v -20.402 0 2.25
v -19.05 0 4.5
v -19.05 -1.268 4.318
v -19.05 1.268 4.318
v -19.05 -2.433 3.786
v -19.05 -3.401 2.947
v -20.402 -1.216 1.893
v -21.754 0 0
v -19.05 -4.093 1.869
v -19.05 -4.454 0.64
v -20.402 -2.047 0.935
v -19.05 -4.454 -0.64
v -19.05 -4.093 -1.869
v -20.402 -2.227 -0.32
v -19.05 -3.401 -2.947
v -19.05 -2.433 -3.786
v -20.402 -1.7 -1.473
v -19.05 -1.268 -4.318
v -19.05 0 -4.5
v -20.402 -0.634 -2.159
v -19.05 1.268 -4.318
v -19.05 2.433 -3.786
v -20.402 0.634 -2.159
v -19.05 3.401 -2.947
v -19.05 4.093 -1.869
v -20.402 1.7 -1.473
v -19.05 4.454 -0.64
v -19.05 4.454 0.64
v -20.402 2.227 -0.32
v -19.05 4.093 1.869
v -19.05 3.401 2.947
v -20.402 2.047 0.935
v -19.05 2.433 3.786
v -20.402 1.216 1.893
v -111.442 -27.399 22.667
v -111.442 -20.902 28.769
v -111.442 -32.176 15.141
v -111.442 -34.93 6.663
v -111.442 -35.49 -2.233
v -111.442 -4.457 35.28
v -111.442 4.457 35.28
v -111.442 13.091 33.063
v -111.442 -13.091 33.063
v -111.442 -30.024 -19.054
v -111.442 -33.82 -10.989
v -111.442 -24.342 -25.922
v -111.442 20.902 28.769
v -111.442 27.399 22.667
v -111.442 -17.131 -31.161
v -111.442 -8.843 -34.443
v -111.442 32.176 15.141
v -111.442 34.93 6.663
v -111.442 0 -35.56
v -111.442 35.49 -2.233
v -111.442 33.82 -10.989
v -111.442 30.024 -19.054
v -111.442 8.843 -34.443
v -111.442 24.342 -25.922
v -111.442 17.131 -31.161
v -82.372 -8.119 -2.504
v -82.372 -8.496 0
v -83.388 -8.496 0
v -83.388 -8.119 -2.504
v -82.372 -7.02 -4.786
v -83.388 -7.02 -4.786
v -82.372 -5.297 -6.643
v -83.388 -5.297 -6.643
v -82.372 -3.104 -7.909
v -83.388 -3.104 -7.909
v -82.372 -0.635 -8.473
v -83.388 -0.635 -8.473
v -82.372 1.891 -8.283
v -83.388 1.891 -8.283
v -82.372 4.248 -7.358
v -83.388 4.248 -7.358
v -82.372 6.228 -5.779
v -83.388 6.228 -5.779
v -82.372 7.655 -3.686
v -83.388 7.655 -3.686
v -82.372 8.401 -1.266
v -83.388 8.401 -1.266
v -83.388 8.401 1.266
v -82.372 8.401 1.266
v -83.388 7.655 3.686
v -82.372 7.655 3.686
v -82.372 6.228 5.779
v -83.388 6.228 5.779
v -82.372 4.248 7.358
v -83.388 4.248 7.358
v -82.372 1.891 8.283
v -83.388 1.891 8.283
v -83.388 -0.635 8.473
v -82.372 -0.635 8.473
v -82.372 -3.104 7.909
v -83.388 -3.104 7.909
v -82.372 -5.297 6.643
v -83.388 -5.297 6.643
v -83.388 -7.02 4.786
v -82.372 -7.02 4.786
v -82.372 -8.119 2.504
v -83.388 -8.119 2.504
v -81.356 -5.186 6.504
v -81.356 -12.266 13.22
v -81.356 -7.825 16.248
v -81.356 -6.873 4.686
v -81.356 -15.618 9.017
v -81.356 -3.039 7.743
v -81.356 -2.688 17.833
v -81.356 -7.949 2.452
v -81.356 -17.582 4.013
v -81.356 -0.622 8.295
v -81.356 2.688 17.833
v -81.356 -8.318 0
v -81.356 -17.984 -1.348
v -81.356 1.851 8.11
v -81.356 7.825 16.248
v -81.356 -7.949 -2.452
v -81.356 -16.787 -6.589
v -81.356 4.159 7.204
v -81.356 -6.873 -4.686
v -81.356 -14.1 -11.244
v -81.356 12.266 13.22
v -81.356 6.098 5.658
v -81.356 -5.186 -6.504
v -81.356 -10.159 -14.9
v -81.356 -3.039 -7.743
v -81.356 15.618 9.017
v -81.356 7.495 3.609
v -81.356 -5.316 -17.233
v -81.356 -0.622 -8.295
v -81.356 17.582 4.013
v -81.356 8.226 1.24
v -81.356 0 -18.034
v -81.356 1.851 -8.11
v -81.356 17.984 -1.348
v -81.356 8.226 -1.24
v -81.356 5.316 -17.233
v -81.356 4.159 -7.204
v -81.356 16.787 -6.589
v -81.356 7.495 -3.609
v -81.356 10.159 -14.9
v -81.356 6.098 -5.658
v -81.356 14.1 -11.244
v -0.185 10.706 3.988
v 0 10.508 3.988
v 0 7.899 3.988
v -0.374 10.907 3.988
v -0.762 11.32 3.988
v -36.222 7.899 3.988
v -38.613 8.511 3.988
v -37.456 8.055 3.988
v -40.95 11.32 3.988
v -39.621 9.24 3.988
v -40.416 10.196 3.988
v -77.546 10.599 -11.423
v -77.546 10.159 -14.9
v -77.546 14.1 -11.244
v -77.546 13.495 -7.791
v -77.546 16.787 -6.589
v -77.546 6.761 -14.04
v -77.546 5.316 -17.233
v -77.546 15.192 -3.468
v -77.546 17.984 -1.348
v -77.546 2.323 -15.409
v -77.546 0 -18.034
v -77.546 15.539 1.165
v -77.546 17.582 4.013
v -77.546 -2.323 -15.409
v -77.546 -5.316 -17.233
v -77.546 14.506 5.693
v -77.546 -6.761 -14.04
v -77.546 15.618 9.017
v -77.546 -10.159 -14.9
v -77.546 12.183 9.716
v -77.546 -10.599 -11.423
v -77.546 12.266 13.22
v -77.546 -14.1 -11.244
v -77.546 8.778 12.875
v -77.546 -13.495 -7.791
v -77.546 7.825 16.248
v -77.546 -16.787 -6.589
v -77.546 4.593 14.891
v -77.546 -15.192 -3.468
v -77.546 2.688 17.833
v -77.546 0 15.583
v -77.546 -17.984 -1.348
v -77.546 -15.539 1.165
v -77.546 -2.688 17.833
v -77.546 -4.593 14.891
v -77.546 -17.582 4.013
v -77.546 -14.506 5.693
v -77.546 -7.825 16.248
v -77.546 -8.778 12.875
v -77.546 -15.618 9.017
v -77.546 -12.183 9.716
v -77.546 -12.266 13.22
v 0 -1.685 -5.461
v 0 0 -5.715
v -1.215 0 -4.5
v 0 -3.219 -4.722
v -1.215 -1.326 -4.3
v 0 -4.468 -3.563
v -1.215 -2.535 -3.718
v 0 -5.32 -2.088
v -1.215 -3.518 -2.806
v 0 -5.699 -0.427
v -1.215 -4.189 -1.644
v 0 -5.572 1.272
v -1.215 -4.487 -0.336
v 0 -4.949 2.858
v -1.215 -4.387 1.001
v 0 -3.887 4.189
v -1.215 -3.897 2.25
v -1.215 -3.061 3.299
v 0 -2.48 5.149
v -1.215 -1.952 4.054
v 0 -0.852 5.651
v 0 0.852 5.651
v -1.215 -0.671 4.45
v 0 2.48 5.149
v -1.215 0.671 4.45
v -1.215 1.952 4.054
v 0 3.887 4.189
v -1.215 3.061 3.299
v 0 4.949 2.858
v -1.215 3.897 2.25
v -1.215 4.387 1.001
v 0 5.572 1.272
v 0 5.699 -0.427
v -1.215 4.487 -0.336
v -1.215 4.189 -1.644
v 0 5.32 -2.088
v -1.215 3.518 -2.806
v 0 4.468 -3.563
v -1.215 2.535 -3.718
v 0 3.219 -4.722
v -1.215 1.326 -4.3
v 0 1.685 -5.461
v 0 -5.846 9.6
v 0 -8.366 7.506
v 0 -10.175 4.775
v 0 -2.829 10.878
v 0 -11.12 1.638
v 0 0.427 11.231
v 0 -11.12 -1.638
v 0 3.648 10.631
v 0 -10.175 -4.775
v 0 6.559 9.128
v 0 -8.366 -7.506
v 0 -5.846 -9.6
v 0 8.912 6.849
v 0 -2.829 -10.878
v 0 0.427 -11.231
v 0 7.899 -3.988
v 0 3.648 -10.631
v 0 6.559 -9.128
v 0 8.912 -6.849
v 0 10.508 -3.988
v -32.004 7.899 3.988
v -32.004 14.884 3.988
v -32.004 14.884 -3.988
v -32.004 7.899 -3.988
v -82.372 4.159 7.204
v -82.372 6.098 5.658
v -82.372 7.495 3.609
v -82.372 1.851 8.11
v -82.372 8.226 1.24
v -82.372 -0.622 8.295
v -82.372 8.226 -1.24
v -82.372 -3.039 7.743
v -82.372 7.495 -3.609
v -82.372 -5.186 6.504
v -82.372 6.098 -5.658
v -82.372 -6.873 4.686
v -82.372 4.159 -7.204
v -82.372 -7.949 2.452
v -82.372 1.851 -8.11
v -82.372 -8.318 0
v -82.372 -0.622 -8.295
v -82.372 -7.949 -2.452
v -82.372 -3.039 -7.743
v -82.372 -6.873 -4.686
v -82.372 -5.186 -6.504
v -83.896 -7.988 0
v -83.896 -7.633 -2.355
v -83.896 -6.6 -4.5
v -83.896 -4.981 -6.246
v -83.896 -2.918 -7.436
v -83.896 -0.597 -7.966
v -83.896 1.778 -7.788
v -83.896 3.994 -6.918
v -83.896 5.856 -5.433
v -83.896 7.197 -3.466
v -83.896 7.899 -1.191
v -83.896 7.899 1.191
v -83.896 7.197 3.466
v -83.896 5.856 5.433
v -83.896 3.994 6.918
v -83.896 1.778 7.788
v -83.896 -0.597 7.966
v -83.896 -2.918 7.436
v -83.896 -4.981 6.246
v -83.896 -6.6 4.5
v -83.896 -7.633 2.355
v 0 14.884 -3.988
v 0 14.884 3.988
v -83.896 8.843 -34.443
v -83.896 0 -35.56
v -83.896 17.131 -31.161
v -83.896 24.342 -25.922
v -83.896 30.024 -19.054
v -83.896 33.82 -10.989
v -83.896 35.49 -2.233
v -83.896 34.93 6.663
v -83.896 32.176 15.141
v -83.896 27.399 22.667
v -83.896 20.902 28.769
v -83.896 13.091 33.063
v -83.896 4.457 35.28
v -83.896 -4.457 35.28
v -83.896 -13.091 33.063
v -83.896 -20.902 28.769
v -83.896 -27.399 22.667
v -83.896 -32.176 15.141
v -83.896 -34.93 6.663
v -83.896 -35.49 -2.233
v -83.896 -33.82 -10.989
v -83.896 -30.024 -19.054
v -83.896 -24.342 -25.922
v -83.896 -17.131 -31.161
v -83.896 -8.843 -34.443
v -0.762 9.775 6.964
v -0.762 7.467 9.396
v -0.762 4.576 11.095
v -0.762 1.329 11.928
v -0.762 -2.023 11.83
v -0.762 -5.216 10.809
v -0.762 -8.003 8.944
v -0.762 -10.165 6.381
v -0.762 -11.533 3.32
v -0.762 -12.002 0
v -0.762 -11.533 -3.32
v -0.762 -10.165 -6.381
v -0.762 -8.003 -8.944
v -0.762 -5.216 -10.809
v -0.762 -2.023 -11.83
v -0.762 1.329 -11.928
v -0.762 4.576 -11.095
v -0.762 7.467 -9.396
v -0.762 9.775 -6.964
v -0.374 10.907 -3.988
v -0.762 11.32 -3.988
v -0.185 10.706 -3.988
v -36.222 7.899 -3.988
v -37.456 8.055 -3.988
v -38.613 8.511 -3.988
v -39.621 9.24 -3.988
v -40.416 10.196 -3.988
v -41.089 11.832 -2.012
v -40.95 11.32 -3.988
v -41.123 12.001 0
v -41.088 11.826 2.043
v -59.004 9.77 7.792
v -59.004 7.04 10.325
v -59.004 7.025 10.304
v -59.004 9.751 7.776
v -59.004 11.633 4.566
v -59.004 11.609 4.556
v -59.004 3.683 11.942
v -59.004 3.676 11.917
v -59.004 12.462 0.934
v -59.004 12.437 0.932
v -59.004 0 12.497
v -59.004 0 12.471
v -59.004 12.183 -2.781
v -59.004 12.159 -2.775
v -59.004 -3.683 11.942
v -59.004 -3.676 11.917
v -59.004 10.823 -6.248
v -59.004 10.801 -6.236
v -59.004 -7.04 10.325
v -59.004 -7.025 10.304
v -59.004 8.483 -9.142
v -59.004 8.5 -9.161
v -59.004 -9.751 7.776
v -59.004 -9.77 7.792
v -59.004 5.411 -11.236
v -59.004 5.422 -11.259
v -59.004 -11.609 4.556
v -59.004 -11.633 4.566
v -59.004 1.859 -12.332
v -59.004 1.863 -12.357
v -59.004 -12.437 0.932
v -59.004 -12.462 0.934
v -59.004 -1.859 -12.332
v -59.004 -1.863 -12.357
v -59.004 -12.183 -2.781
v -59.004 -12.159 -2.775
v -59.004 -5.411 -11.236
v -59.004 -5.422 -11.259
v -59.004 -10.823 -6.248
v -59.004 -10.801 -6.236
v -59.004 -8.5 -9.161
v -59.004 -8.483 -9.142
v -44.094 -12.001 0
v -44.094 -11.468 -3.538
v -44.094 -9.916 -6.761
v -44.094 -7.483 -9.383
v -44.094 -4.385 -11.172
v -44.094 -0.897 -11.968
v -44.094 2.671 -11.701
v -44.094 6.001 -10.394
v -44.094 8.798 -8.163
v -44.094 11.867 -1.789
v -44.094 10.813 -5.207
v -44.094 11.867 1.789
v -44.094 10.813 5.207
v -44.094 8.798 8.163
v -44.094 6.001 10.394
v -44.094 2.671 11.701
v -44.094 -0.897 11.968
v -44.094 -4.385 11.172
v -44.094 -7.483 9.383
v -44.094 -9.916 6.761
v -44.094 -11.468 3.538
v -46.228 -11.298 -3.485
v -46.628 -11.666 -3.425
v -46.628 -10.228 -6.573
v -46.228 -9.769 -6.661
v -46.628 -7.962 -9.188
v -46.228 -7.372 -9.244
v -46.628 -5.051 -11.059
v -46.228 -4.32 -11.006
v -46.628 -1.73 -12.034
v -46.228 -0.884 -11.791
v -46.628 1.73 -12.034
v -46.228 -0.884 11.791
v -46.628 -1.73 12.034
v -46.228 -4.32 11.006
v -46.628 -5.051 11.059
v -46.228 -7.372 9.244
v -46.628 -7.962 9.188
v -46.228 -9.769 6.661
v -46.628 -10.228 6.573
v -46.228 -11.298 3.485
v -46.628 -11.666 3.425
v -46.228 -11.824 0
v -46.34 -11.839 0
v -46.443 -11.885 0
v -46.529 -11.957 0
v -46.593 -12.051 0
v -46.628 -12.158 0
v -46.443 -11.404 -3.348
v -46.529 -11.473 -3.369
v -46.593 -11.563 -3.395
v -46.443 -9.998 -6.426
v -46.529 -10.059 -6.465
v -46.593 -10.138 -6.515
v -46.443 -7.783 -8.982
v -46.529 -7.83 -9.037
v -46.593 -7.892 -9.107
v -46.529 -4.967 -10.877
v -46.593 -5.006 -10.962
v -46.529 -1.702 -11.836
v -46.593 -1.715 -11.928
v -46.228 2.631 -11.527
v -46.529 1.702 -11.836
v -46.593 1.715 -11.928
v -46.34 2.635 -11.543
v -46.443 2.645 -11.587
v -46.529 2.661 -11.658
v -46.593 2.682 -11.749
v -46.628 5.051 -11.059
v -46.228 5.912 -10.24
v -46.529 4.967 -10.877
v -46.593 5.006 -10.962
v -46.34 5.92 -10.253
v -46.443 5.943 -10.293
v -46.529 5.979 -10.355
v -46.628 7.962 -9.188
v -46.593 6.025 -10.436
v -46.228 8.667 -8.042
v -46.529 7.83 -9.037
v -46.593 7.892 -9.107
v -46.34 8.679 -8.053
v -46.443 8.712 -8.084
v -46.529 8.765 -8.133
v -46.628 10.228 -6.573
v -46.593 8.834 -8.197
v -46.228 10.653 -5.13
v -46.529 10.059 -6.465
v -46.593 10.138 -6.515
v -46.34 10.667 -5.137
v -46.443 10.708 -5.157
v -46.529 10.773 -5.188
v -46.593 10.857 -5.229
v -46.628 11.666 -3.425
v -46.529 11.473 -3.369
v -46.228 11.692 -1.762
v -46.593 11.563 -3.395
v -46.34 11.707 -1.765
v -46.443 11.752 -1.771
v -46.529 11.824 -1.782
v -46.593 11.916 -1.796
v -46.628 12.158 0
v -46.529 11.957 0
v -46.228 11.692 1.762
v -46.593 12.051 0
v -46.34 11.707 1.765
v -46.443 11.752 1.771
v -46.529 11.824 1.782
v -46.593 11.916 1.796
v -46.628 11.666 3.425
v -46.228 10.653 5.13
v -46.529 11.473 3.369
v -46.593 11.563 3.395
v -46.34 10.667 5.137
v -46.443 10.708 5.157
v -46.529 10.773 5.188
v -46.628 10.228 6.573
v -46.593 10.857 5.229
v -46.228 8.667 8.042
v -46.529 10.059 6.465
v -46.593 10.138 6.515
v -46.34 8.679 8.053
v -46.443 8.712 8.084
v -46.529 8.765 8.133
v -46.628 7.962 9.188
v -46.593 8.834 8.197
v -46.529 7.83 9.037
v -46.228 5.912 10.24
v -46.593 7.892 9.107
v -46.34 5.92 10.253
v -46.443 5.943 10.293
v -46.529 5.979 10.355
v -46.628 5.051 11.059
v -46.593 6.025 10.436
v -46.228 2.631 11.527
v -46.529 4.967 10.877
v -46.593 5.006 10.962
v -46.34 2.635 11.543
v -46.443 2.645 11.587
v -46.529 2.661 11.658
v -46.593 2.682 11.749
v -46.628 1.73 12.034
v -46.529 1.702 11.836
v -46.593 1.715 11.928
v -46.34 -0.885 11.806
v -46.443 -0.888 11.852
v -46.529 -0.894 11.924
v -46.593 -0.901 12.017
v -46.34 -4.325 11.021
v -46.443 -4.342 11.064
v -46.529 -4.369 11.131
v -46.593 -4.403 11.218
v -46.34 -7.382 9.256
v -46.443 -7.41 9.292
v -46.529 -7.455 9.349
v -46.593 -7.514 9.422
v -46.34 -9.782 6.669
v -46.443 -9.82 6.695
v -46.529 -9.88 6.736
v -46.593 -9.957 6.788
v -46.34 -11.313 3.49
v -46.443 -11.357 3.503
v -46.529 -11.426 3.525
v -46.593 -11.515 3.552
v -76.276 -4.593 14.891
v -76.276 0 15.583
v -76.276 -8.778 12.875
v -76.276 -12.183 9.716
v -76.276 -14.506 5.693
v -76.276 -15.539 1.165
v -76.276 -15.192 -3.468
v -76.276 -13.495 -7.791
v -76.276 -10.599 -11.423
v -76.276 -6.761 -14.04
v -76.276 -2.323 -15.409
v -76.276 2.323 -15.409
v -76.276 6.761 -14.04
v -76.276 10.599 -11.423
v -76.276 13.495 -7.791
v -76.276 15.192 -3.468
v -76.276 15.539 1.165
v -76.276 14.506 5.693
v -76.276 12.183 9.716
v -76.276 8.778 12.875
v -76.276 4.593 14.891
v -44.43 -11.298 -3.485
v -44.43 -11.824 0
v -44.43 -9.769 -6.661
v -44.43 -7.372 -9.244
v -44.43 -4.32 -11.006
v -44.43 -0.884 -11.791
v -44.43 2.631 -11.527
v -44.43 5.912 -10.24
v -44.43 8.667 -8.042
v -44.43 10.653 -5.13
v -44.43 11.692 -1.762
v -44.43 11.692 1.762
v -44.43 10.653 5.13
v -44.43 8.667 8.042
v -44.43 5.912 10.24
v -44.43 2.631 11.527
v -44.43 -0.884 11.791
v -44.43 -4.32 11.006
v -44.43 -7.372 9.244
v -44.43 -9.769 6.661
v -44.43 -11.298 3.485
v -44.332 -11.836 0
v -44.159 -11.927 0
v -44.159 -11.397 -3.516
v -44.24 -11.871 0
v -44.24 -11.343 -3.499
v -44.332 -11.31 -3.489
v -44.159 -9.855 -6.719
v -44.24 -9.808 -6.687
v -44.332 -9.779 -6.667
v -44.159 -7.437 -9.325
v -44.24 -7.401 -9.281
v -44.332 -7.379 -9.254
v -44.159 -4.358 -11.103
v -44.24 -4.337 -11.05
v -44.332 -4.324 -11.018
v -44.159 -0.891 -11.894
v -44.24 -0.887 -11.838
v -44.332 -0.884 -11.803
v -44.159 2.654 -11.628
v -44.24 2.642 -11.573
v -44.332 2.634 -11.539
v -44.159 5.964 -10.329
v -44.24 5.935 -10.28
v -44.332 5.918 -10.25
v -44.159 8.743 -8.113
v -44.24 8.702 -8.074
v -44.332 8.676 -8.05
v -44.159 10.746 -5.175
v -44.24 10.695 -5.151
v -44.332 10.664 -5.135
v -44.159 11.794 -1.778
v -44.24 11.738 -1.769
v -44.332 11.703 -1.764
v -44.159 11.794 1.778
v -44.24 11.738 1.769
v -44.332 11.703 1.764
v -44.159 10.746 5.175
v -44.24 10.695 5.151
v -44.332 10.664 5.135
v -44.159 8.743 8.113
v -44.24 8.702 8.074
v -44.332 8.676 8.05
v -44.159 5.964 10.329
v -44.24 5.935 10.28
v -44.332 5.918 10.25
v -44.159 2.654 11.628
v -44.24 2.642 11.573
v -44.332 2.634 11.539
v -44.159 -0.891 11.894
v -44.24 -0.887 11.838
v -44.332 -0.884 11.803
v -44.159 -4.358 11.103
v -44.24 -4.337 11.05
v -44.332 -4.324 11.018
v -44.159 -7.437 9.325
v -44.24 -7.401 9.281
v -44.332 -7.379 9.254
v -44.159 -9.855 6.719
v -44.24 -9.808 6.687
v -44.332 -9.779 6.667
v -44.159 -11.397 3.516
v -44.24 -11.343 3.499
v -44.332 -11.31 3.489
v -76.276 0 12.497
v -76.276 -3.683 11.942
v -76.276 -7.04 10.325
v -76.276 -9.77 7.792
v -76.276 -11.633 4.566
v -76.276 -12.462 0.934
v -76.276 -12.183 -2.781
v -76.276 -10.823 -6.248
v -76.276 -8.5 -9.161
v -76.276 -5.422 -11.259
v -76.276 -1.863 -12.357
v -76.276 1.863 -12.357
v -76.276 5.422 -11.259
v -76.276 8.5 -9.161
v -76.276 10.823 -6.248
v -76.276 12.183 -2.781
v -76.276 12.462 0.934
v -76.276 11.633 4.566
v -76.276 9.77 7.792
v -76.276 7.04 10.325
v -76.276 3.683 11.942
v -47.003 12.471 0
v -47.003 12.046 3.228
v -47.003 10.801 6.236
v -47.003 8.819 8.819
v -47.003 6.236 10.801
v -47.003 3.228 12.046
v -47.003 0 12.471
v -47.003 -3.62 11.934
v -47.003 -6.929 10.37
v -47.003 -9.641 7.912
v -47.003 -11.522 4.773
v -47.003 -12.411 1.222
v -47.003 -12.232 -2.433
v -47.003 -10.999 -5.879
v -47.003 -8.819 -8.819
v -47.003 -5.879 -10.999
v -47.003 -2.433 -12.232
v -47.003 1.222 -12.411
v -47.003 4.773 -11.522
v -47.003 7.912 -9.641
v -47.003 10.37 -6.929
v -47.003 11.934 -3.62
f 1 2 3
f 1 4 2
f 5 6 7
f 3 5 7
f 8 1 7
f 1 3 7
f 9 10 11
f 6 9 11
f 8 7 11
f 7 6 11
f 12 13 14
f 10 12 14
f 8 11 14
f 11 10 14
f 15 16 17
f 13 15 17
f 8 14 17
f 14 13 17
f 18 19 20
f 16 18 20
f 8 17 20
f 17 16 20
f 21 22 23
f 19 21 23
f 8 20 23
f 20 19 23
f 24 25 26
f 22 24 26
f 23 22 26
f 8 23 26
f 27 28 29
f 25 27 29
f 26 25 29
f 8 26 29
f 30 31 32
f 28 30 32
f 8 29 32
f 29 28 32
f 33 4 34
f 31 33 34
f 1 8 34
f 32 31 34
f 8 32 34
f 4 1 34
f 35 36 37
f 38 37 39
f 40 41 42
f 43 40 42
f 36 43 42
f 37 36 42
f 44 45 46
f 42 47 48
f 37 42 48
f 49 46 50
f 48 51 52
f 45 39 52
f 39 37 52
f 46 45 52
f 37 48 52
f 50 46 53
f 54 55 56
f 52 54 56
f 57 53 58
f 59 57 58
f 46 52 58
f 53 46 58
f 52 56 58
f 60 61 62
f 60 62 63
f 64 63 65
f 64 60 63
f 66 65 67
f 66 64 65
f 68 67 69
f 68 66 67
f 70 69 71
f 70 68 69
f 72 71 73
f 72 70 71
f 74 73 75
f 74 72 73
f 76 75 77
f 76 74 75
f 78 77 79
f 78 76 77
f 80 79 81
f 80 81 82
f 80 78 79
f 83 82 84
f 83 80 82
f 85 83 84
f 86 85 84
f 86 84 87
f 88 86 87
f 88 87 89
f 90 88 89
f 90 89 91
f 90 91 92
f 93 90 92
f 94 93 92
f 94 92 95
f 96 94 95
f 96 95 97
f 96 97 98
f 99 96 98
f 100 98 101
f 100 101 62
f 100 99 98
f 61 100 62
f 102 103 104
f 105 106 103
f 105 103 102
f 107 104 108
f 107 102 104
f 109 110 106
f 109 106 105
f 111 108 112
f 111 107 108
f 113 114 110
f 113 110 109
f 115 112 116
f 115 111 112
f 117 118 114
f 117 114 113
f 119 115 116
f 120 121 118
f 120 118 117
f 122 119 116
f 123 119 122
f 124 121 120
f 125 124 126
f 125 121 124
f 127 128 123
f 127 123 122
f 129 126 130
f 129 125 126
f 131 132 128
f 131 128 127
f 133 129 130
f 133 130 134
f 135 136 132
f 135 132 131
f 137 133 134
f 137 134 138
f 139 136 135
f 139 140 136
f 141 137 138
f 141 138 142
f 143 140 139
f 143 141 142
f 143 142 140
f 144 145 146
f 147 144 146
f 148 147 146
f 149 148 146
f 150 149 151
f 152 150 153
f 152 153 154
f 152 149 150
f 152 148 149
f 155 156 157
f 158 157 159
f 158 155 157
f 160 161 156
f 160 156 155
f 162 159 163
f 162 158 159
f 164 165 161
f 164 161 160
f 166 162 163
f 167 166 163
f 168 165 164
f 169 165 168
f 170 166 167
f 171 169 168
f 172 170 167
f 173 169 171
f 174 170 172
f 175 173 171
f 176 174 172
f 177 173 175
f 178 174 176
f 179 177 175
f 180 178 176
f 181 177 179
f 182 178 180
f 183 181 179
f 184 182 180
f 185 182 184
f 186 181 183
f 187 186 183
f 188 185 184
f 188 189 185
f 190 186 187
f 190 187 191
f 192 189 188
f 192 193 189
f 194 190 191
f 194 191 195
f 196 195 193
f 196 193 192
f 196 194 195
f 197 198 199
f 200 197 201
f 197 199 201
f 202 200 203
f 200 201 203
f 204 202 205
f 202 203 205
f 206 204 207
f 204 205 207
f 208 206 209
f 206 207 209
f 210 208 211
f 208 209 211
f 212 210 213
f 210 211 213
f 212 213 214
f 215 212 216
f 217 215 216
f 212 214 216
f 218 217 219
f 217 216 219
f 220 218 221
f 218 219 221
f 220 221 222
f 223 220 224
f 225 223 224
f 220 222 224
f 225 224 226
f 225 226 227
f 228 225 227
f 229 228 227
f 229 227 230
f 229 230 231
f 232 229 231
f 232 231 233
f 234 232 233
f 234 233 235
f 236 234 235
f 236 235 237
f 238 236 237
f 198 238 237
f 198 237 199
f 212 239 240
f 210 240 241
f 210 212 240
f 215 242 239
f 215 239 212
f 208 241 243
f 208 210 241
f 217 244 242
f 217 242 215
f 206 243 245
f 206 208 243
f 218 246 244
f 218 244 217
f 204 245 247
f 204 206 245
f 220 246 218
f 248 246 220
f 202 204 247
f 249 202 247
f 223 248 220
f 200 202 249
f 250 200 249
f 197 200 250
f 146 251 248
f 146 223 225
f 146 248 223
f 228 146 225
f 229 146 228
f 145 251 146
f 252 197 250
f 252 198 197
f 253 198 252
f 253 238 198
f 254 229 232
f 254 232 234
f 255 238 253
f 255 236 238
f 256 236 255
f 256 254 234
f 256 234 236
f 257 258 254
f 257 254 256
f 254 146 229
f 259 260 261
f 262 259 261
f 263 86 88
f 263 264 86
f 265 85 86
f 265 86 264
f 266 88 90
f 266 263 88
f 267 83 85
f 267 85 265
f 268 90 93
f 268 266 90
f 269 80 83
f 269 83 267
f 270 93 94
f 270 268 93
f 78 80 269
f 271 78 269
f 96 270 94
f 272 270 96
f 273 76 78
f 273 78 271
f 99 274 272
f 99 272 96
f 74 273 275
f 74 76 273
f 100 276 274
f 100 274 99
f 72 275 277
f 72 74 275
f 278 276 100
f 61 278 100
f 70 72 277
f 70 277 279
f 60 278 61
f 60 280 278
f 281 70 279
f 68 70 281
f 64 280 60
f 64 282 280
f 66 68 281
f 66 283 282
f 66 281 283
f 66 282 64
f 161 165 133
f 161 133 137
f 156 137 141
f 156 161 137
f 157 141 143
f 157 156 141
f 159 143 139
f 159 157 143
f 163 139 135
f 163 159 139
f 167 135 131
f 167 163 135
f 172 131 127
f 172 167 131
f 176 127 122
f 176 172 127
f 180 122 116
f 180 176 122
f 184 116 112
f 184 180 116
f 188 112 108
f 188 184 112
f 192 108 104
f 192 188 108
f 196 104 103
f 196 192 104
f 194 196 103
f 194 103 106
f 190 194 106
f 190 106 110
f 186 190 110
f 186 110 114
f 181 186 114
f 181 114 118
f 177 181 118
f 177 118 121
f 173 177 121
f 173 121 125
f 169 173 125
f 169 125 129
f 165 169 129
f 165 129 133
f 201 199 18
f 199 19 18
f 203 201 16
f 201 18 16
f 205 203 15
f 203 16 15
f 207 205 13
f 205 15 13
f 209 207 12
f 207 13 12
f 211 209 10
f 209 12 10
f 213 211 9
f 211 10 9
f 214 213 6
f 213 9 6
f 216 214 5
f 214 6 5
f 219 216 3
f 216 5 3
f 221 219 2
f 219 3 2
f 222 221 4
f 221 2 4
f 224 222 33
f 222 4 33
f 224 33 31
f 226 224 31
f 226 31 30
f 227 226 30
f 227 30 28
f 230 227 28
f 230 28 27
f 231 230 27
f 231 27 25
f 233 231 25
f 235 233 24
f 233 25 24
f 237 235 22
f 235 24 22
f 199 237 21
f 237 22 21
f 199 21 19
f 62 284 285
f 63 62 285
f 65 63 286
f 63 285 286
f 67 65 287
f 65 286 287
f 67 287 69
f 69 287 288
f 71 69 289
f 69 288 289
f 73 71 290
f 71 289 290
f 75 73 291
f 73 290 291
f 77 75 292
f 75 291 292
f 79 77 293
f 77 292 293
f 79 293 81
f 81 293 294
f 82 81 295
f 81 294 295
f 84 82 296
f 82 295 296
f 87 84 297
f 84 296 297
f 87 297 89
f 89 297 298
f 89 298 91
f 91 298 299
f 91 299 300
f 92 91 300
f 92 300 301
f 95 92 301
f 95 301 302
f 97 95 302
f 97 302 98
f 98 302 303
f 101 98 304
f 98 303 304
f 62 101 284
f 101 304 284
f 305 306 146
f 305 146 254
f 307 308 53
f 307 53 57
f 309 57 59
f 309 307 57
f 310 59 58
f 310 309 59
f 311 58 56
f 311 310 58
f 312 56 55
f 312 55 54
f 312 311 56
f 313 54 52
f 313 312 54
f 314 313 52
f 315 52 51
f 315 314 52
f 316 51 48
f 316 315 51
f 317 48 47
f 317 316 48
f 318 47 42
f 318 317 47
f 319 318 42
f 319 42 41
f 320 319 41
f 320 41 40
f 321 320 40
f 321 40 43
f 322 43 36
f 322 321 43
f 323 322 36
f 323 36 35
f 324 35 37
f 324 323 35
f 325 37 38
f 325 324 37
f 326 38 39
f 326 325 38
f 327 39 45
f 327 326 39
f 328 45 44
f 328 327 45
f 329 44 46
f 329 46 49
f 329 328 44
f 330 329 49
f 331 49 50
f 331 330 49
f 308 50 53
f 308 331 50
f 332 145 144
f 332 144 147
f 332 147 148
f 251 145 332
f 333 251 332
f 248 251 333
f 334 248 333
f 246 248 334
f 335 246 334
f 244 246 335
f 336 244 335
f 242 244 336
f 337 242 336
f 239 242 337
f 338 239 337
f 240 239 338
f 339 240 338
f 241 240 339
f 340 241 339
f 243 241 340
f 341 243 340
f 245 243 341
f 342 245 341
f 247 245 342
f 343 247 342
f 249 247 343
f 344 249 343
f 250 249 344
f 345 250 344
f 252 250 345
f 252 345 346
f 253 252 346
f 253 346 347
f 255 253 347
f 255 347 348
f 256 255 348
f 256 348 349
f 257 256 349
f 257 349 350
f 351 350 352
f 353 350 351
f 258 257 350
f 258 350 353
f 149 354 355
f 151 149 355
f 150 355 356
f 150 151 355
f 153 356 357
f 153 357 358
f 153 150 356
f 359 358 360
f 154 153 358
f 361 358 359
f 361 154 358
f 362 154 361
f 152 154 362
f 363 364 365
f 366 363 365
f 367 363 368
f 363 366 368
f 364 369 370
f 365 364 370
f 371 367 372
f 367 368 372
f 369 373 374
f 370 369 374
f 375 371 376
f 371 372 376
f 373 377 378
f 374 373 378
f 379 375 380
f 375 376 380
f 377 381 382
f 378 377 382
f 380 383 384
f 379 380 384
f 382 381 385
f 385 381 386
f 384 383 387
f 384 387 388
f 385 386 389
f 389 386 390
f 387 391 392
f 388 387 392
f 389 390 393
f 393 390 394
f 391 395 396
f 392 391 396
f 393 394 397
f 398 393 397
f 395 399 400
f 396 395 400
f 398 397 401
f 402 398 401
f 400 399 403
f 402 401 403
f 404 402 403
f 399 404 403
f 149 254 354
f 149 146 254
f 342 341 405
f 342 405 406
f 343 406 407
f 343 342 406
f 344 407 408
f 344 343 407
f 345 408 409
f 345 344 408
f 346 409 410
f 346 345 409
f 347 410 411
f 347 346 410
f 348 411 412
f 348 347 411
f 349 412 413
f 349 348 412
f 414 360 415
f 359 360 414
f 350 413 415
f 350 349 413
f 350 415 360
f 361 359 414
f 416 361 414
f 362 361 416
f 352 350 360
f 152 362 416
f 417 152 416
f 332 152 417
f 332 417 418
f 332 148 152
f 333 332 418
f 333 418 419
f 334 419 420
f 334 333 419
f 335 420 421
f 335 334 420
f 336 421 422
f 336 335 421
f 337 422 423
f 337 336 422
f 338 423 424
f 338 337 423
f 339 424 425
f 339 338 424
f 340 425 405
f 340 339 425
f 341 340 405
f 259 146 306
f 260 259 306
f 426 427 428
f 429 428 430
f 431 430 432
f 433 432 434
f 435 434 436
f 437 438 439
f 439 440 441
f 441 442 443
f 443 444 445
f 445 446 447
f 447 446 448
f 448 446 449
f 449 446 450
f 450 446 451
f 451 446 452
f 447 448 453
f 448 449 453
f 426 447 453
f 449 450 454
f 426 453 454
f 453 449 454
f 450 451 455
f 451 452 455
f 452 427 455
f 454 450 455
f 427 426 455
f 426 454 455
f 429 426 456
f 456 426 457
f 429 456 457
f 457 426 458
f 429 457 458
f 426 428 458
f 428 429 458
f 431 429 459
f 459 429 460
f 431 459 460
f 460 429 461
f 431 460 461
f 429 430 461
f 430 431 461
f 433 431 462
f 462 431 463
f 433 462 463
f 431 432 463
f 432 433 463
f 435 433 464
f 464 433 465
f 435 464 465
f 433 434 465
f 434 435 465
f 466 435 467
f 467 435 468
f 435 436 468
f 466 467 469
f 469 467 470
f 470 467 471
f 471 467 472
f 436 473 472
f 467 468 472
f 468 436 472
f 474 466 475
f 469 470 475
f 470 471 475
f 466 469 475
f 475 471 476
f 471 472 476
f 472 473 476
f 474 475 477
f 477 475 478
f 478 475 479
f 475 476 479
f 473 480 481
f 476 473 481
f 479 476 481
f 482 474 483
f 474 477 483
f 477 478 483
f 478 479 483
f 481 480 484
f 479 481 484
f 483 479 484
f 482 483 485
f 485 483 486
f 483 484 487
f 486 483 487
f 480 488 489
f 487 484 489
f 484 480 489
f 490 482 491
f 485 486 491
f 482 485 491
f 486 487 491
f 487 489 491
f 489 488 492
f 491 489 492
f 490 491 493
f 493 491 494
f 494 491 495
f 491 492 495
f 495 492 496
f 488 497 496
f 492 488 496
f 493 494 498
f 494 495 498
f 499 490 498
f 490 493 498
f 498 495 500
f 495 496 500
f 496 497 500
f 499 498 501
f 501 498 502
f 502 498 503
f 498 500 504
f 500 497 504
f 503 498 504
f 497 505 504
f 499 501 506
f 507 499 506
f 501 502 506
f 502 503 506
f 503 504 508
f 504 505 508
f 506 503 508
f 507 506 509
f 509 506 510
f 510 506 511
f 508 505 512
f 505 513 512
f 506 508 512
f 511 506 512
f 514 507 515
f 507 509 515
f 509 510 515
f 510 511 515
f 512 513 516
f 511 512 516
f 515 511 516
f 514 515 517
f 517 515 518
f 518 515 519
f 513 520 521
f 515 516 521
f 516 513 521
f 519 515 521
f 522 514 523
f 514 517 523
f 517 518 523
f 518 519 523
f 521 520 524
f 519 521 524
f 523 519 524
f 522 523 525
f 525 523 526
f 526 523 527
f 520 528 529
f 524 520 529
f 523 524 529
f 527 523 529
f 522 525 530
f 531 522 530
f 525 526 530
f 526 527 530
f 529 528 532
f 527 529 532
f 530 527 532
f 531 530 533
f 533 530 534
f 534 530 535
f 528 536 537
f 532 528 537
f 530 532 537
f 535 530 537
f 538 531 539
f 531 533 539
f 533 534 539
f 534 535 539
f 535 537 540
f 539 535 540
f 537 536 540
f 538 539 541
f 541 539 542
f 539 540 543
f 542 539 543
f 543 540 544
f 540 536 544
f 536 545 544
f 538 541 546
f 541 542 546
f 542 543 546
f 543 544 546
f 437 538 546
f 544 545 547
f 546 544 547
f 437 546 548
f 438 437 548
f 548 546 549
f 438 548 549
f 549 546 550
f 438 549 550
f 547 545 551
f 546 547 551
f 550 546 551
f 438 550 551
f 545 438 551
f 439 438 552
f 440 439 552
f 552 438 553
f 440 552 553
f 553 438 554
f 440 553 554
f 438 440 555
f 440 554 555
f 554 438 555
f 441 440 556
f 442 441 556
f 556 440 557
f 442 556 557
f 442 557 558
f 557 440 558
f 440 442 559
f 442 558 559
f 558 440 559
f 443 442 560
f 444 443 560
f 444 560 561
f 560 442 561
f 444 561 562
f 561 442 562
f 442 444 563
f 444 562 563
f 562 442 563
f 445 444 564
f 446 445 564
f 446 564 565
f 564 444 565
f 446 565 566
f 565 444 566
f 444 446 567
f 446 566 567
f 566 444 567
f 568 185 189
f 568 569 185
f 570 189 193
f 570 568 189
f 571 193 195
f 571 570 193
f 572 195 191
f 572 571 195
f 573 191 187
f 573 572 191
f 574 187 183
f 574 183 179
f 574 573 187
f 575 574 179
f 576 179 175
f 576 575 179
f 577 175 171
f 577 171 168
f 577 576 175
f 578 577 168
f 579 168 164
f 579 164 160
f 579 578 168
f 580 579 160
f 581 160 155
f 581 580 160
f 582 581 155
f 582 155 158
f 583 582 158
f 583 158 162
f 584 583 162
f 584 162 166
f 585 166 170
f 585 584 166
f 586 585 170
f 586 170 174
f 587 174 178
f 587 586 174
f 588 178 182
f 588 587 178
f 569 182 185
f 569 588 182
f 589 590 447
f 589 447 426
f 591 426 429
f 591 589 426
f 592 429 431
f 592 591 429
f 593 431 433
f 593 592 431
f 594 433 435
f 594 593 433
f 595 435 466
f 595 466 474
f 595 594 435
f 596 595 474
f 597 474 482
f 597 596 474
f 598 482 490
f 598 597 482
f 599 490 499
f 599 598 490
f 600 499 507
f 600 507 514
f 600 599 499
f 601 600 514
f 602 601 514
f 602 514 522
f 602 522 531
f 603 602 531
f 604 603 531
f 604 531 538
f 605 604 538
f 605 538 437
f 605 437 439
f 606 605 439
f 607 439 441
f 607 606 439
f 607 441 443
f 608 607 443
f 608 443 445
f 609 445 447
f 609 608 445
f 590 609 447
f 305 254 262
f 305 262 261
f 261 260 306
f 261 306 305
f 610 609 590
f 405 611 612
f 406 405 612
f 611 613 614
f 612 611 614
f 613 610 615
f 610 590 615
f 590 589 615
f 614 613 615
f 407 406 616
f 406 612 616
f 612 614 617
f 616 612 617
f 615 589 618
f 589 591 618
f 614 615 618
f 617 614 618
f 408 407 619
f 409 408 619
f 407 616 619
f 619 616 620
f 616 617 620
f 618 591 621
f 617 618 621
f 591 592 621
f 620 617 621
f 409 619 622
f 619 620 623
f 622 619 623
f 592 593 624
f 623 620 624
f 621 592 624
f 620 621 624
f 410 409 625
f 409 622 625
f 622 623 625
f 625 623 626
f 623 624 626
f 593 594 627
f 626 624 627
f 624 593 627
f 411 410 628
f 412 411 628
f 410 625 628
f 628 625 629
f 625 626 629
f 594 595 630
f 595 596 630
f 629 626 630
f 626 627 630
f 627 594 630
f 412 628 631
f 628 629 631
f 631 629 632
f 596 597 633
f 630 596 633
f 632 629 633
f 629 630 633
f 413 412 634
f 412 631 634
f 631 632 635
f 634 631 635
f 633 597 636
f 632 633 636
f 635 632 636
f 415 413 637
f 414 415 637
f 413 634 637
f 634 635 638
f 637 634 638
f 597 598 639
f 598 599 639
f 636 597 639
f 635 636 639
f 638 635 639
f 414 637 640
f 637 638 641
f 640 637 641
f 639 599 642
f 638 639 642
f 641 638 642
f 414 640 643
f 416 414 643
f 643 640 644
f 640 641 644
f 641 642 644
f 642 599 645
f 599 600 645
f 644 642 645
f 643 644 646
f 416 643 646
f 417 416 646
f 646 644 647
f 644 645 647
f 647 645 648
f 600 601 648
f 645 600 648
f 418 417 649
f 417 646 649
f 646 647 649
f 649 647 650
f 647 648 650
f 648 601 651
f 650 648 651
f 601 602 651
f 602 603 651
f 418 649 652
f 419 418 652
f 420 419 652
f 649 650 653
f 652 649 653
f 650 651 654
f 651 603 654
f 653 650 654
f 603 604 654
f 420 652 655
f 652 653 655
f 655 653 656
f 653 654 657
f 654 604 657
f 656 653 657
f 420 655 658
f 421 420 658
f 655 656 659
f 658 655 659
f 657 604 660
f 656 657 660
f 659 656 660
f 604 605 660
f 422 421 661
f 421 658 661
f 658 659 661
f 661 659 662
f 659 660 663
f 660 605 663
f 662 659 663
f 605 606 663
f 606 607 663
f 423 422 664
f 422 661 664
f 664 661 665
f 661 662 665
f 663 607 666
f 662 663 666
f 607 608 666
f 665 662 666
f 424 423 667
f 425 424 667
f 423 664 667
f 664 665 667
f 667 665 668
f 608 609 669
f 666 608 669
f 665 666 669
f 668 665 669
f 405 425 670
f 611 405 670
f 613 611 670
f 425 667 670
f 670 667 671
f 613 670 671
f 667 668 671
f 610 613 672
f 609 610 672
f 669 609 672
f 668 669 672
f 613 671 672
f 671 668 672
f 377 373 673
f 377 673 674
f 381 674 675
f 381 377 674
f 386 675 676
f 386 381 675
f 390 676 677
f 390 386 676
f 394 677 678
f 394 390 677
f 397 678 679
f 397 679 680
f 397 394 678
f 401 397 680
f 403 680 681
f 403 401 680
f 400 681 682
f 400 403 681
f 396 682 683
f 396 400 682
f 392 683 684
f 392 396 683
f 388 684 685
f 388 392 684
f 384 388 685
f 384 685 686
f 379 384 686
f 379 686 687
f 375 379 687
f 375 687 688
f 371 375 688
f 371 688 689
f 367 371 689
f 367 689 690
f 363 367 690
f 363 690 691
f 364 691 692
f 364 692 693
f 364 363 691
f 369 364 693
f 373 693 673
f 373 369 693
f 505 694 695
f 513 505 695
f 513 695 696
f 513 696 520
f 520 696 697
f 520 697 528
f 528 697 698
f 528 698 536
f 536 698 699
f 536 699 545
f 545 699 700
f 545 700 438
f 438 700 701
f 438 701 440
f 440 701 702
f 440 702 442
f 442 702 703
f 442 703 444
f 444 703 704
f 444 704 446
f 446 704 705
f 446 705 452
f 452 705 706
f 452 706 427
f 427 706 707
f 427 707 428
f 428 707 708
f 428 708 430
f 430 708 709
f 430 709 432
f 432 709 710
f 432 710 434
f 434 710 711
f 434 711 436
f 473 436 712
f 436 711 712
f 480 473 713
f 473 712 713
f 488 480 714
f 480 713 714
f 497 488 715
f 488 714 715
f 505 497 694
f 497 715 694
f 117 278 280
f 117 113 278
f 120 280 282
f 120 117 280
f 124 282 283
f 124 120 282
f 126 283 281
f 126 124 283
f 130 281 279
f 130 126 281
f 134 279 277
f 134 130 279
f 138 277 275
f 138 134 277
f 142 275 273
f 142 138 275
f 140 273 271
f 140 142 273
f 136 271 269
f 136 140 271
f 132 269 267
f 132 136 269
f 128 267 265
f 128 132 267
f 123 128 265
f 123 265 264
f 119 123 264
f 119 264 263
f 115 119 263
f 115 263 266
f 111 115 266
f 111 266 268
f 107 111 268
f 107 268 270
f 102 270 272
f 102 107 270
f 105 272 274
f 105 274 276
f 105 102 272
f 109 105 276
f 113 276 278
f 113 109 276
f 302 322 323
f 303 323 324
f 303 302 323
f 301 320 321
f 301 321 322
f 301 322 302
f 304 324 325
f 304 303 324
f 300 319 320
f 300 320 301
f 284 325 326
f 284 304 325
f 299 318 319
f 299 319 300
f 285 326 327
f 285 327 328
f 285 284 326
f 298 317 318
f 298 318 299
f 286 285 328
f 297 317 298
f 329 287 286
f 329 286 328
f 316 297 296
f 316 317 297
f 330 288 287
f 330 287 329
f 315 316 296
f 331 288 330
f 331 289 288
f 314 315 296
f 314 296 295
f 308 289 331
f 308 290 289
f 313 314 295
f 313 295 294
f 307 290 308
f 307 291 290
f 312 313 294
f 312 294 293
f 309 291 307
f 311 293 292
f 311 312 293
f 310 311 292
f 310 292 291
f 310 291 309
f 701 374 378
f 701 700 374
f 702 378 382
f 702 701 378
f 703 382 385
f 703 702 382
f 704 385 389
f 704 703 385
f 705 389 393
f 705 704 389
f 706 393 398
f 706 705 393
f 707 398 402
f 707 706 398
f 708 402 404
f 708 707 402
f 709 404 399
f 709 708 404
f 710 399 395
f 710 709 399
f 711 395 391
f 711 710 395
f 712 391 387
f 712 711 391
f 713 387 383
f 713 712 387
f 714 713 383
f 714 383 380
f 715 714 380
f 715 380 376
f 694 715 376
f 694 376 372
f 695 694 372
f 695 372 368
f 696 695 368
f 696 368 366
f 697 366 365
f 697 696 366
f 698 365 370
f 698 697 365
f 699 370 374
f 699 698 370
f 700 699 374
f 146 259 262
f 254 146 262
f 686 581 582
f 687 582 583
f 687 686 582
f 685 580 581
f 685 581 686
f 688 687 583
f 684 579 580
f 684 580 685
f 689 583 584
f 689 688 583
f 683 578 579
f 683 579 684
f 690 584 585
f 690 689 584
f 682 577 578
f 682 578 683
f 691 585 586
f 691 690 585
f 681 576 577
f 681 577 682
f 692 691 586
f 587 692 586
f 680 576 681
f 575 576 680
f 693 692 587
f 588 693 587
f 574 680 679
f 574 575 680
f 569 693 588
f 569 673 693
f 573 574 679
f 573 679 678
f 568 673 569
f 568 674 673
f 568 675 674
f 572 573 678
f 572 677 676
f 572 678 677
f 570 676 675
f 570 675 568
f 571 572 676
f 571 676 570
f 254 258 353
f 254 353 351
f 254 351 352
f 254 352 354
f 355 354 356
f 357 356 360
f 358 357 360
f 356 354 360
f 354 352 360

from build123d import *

# Parameters (mm, degrees)
SKETCH2_R                                           = 18.034
EXTRUDE1_DEPTH                                      = 83.8962
SKETCH5_W                                           = 59.0042
SKETCH5_H                                           = 0.0254
SKETCH12_W                                          = 46.6344
SKETCH12_H                                          = 0.4699
SKETCH13_W                                          = 2.54
SKETCH13_H                                          = 0.1778
CSK_FOR_M8_COUNTERSUNK_FLAT_HEAD_SCREW1_D           = 9
CSK_FOR_M8_COUNTERSUNK_FLAT_HEAD_SCREW1_DEPTH       = 19.05
CSK_FOR_M8_COUNTERSUNK_FLAT_HEAD_SCREW1_CSINK_D     = 11.43
CSK_FOR_M8_COUNTERSUNK_FLAT_HEAD_SCREW1_CSINK_ANGLE = 90
CSK_FOR_M8_COUNTERSUNK_FLAT_HEAD_SCREW1_TIP         = 2.703872786
CHAMFER3_SIZE                                       = 0.762
FILLET1_R                                           = 0.4064
EXTRUDE2_DEPTH                                      = 3.9878
SKETCH9_W                                           = 7.9756
SKETCH9_H                                           = 6.985
EXTRUDE3_DEPTH                                      = 32.004
CHAMFER1_SIZE                                       = 0.508
SKETCH10_R                                          = 35.56
EXTRUDE4_DEPTH                                      = 27.5463


with BuildPart() as part:
    # Sketch2 → Extrude1 (new body)
    with BuildSketch(Plane(origin=(0, 0, 0), x_dir=(0, 0, -1), z_dir=(1, 0, 0))):
        Circle(SKETCH2_R)
    extrude(amount=-EXTRUDE1_DEPTH)

    # Sketch3 → Cut-Revolve1 (revolve, cut)
    with BuildSketch(Plane.XY, mode=Mode.PRIVATE) as cut_revolve1_sk:
        Polygon((-83.8962, 8.4963), (-82.3722, 8.4963), (-82.3722, 8.3185), (-81.3562, 8.3185), (-81.3562, 18.034), (-83.8962, 18.034), align=None)
    revolve(cut_revolve1_sk.sketch.rotate(Axis((-83.8962, 0, 0), (1, 0, 0)), 180), axis=Axis((-83.8962, 0, 0), (1, 0, 0)), mode=Mode.SUBTRACT)

    # Sketch4 → Cut-Revolve2 (revolve, cut)
    with BuildSketch(Plane.XY, mode=Mode.PRIVATE) as cut_revolve2_sk:
        Polygon((-77.5462, 18.034), (-77.5462, 15.5829), (-76.2762, 15.5829), (-76.2762, 12.4968), (0, 12.4968), (0, 18.034), align=None)
    revolve(cut_revolve2_sk.sketch.rotate(Axis((-83.661895901, 0, 0), (1, 0, 0)), 90), axis=Axis((-83.661895901, 0, 0), (1, 0, 0)), mode=Mode.SUBTRACT)

    # Sketch5 → Cut-Revolve3 (revolve, cut)
    with BuildSketch(Plane.XY, mode=Mode.PRIVATE) as cut_revolve3_sk:
        with Locations((-29.5021, 12.4841)):
            Rectangle(SKETCH5_W, SKETCH5_H)
    revolve(cut_revolve3_sk.sketch.rotate(Axis((-76.2762, 0, 0), (1, 0, 0)), 90), axis=Axis((-76.2762, 0, 0), (1, 0, 0)), mode=Mode.SUBTRACT)

    # Sketch12 → Cut-Revolve4 (revolve, cut)
    with BuildSketch(Plane.XY, mode=Mode.PRIVATE) as cut_revolve4_sk:
        with Locations((-23.3172, 12.23645)):
            Rectangle(SKETCH12_W, SKETCH12_H)
    revolve(cut_revolve4_sk.sketch.rotate(Axis((-81.3562, 0, 0), (1, 0, 0)), 180), axis=Axis((-81.3562, 0, 0), (1, 0, 0)), mode=Mode.SUBTRACT)

    # Sketch13 → Cut-Revolve5 (revolve, cut)
    with BuildSketch(Plane.XY, mode=Mode.PRIVATE) as cut_revolve5_sk:
        with Locations((-45.3644, 11.9126)):
            Rectangle(SKETCH13_W, SKETCH13_H)
    revolve(cut_revolve5_sk.sketch.rotate(Axis((-77.5462, 0, 0), (1, 0, 0)), 180), axis=Axis((-77.5462, 0, 0), (1, 0, 0)), mode=Mode.SUBTRACT)

    # CSK for M8 Countersunk Flat Head Screw1
    with Locations(Plane(origin=(0, 0, 0), x_dir=(0, 0, 1), z_dir=(1, 0, 0))):
        with Locations((0, 0)):
            CounterSinkHole(CSK_FOR_M8_COUNTERSUNK_FLAT_HEAD_SCREW1_D / 2, CSK_FOR_M8_COUNTERSUNK_FLAT_HEAD_SCREW1_CSINK_D / 2, depth=CSK_FOR_M8_COUNTERSUNK_FLAT_HEAD_SCREW1_DEPTH, counter_sink_angle=CSK_FOR_M8_COUNTERSUNK_FLAT_HEAD_SCREW1_CSINK_ANGLE)
            with Locations((0, 0, -(CSK_FOR_M8_COUNTERSUNK_FLAT_HEAD_SCREW1_DEPTH + CSK_FOR_M8_COUNTERSUNK_FLAT_HEAD_SCREW1_TIP / 2))):  # 118° drill point
                Cone(0, CSK_FOR_M8_COUNTERSUNK_FLAT_HEAD_SCREW1_D / 2, CSK_FOR_M8_COUNTERSUNK_FLAT_HEAD_SCREW1_TIP, mode=Mode.SUBTRACT)

    # Chamfer3
    chamfer3_edges = [part.edges().sort_by_distance(p)[0] for p in [
        (0, 12.0015, 0),
    ]]
    chamfer(chamfer3_edges, length=CHAMFER3_SIZE)

    # Fillet1
    # the kernel refuses this fillet: 0.4064 mm, written as the material it adds along each edge
    with BuildSketch(Plane(origin=(-46.6344, 0, 0), x_dir=(0, -1, 0), z_dir=(0, 0, 1))) as fillet1_piece_1:
        with BuildLine():
            CenterArc((11.8237 + FILLET1_R, FILLET1_R), FILLET1_R, 180, 90)
            Line((11.8237 + FILLET1_R, 0), (11.8237 + FILLET1_R, -FILLET1_R * 0.02))
            Line((11.8237 + FILLET1_R, -FILLET1_R * 0.02), (11.8237 - FILLET1_R * 0.02, -FILLET1_R * 0.02))
            Line((11.8237 - FILLET1_R * 0.02, -FILLET1_R * 0.02), (11.8237 - FILLET1_R * 0.02, FILLET1_R))
            Line((11.8237 - FILLET1_R * 0.02, FILLET1_R), (11.8237, FILLET1_R))
        make_face()
    revolve(axis=Axis((-46.6344, 0, 0), (1, 0, 0)))
    with BuildSketch(Plane(origin=(-44.0944, 0, 0), x_dir=(0, -1, 0), z_dir=(0, 0, 1))) as fillet1_piece_2:
        with BuildLine():
            CenterArc((12.2301, -0.336010417), FILLET1_R, 124.228866328, 55.771133672)
            Line((11.8237, -0.336010417), (11.815572, -0.336010417))
            Line((11.815572, -0.336010417), (11.815572, 0))
            Line((11.815572, 0), (11.8237, 0.008128))
            ThreePointArc((11.8237, 0.008128), (11.9126, 0.008128), (11.996928, 0.006720208))
            Line((11.996928, 0.006720208), (12.0015, 0))
        make_face()
    revolve(axis=Axis((-44.0944, 0, 0), (1, 0, 0)))

    # Sketch8 → Extrude2 (cut, symmetric)
    with BuildSketch(Plane.XY):
        with BuildLine():
            Line((-41.1226, 12.0015), (0, 12.0015))
            Line((0, 12.0015), (0, 7.8994))
            Line((0, 7.8994), (-36.221930161, 7.8994))
            ThreePointArc((-36.221930161, 7.8994), (-39.417387455, 9.060272104), (-41.1226, 12.0015))
        make_face()
    extrude(amount=EXTRUDE2_DEPTH, both=True, mode=Mode.SUBTRACT)

    # Chamfer1
    chamfer1_edges = [part.edges().sort_by_distance(p)[0] for p in [
        (-83.8962, 8.4963, 0),
    ]]
    chamfer(chamfer1_edges, length=CHAMFER1_SIZE)

    # Chamfer2: read off the stored shape, not the designer's step
    # Chamfer2 outline → Chamfer2 (revolve, cut)
    with BuildSketch(Plane.YX):
        Polygon((12.2301, -46.627952603), (12.157996774, -46.627952603), (12.4714, -47.002908169), (12.4714, -46.6344), (12.2301, -46.6344), align=None)
    revolve(axis=Axis((0, 0, 0), (1, 0, 0)), mode=Mode.SUBTRACT)

    # Sketch10 → Extrude4 (add)
    with BuildSketch(Plane(origin=(-83.8962, 0, 0), x_dir=(0, 0, -1), z_dir=(1, 0, 0))):
        Circle(SKETCH10_R)
    extrude(amount=-EXTRUDE4_DEPTH)


with BuildPart() as body_2:
    # Sketch9 → Extrude3 (new body)
    with BuildSketch(Plane(origin=(0, 0, 0), x_dir=(0, 0, -1), z_dir=(1, 0, 0))):
        with Locations((0, 11.3919)):
            Rectangle(SKETCH9_W, SKETCH9_H)
    extrude(amount=-EXTRUDE3_DEPTH)


solid = Compound([part.part, body_2.part])
